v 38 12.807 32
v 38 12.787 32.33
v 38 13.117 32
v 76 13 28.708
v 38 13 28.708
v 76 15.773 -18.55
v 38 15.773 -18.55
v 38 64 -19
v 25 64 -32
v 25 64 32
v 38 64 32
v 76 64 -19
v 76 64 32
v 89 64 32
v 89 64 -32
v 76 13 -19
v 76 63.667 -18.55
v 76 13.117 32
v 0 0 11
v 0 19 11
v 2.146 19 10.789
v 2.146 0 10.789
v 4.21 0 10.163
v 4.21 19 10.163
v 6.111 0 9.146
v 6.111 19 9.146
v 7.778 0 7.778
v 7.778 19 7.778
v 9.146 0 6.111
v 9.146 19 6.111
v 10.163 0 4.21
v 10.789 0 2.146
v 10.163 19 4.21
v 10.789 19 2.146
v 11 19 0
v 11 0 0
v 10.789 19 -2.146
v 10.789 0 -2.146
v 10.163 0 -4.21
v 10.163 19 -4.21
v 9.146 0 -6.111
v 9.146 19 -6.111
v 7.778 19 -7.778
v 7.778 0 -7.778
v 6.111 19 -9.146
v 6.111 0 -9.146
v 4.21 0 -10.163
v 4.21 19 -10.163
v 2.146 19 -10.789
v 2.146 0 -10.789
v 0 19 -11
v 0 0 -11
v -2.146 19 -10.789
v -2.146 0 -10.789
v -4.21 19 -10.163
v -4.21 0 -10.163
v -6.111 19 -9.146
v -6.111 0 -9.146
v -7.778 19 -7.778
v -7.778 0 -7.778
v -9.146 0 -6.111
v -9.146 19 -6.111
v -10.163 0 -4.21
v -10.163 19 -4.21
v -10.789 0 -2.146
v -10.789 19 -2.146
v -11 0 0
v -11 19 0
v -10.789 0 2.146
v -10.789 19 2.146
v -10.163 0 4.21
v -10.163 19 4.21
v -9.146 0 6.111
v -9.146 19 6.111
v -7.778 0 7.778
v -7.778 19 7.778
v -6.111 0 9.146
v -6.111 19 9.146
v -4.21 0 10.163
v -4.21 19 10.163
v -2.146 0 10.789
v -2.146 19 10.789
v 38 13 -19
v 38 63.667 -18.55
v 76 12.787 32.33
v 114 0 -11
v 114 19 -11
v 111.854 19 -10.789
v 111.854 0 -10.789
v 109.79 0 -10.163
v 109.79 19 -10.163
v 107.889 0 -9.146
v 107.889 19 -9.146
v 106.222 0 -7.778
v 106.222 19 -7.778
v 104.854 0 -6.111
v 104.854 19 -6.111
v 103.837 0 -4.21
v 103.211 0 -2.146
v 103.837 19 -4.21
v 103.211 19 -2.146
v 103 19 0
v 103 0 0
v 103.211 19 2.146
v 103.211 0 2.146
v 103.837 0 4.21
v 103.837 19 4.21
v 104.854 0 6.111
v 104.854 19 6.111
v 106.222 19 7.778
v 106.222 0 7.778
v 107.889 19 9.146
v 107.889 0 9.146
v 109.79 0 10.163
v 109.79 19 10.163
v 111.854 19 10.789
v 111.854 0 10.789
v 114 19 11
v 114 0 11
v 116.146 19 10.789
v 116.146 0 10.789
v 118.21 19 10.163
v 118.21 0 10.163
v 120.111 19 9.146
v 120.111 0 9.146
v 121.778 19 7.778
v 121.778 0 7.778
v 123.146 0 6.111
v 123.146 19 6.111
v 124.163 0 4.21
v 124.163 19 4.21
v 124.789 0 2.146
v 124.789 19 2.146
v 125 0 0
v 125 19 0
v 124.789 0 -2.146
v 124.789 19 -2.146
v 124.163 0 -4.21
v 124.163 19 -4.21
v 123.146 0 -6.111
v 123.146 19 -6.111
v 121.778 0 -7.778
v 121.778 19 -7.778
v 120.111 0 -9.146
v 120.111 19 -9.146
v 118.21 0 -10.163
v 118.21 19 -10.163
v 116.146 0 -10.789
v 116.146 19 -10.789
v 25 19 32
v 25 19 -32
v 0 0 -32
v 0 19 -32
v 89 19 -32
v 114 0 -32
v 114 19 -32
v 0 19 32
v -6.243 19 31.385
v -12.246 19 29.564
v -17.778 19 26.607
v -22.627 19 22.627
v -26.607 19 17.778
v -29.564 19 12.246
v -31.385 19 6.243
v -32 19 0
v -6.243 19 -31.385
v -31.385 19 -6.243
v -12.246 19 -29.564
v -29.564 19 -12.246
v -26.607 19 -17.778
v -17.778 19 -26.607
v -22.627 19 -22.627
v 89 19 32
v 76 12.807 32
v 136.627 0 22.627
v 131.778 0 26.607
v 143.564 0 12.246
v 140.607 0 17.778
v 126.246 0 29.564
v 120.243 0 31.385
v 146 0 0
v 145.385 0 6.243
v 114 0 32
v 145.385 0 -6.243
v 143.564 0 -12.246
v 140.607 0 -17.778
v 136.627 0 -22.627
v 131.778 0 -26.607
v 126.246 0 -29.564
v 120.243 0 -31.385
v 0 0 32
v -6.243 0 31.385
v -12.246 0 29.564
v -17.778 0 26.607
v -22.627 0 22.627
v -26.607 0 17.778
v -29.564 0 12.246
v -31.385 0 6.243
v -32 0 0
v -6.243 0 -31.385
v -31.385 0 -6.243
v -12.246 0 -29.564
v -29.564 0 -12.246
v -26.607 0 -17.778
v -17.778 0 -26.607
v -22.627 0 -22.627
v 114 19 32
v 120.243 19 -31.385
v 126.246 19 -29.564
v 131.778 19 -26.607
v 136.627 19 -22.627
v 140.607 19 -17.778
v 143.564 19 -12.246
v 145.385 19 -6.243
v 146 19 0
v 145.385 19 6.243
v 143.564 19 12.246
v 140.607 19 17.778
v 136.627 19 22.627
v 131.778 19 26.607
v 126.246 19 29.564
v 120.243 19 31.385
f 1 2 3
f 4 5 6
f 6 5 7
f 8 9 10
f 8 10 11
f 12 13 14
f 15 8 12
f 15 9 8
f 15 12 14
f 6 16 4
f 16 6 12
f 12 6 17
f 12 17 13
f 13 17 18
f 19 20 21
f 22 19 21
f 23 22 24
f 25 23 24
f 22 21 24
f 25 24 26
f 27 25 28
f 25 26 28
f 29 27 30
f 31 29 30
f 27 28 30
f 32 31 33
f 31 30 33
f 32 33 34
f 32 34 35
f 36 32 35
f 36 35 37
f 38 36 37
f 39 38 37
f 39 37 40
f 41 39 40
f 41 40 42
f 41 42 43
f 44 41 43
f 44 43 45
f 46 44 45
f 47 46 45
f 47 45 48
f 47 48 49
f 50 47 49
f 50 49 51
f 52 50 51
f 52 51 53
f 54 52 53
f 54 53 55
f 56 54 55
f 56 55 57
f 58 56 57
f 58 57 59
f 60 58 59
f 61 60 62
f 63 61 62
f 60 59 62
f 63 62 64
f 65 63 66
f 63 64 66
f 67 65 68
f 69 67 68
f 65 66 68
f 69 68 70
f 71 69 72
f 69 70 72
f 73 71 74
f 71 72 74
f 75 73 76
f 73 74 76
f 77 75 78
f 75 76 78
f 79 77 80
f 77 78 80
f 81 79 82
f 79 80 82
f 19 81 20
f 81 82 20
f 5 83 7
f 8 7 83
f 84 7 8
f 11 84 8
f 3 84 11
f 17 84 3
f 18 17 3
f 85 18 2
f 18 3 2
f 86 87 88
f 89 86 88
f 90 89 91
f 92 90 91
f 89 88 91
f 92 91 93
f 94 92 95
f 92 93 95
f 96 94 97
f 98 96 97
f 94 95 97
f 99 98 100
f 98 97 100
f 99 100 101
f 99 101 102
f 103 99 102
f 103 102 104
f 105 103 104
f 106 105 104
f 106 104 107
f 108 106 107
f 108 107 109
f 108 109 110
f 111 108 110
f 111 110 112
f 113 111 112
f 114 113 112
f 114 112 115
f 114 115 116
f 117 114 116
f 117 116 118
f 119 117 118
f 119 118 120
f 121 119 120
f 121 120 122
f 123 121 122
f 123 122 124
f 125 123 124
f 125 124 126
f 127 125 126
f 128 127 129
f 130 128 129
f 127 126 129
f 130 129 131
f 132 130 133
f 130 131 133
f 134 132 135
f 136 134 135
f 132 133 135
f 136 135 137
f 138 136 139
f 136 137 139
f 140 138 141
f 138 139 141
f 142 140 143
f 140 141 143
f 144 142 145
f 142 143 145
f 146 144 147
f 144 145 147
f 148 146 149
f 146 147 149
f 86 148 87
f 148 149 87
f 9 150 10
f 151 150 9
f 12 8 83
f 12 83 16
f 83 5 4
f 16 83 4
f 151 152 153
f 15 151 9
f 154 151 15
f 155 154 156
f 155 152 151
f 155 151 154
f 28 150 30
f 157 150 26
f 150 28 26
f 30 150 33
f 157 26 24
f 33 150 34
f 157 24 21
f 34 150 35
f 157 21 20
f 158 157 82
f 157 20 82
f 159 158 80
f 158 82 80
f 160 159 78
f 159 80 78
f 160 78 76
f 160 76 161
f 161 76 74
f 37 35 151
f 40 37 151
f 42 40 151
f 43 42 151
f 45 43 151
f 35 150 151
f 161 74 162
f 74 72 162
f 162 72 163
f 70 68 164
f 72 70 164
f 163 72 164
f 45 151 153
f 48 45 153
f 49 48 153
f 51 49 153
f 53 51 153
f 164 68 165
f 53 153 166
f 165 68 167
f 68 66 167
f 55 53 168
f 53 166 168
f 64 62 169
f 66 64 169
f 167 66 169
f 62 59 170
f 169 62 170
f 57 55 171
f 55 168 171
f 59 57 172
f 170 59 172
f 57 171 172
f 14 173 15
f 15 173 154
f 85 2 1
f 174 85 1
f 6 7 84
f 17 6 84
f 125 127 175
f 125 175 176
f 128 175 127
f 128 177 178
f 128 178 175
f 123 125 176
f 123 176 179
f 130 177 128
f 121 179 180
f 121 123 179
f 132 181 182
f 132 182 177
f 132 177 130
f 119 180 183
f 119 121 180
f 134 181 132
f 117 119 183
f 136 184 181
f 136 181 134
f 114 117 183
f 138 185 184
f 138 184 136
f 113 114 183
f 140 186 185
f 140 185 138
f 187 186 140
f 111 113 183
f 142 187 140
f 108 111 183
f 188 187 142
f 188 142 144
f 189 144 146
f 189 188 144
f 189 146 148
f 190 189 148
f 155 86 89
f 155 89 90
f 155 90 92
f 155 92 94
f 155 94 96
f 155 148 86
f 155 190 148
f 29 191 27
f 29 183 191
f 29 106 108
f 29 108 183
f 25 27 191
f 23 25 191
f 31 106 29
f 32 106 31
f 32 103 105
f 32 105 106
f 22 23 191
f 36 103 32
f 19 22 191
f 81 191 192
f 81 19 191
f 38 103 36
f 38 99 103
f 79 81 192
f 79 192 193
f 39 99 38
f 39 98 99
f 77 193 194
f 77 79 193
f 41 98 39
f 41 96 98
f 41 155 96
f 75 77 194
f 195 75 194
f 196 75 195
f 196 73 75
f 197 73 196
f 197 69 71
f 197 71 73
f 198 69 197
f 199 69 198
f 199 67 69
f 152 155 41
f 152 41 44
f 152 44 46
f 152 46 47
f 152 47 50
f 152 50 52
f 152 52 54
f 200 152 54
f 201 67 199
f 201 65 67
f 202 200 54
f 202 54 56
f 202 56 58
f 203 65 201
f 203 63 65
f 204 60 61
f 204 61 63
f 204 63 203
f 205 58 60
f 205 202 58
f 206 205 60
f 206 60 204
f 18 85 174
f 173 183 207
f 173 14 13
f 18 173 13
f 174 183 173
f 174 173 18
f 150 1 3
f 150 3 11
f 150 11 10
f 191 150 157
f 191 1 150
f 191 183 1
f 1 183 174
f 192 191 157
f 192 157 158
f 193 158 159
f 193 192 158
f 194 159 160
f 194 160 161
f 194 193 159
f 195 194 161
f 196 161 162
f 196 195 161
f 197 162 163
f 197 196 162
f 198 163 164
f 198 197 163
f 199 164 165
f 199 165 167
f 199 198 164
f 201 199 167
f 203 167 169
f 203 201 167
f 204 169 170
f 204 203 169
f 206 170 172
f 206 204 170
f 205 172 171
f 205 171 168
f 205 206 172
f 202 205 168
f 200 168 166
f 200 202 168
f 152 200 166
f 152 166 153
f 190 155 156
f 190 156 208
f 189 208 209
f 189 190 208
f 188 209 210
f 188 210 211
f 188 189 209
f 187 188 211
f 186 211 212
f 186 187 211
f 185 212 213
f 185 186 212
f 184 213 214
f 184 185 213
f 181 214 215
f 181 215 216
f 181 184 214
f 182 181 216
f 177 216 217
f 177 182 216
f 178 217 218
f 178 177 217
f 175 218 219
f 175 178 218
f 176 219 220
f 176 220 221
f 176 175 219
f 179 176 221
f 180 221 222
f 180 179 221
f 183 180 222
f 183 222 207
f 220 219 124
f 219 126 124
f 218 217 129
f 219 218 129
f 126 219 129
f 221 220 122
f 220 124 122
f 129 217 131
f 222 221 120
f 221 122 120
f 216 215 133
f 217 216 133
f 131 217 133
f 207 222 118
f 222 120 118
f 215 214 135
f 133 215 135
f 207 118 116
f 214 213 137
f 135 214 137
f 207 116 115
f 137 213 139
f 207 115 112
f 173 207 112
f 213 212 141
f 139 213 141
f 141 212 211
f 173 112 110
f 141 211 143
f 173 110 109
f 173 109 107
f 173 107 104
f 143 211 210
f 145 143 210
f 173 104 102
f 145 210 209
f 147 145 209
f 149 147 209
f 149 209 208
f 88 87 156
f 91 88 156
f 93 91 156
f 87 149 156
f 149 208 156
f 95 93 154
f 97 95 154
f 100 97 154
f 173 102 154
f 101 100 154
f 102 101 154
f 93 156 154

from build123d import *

# Parameters (mm, degrees)
BOSS_EXTRUDE2_DEPTH = 19
SKETCH4_R           = 11
CUT_EXTRUDE1_DEPTH  = 151.668510313
SKETCH5_W           = 64
SKETCH5_H           = 64
BOSS_EXTRUDE3_DEPTH = 45
SKETCH6_W           = 38
SKETCH6_H           = 51
CUT_EXTRUDE2_DEPTH  = 51
BOSS_EXTRUDE4_DEPTH = 38


with BuildPart() as part:
    # Sketch3 → Boss-Extrude2 (new body)
    with BuildSketch(Plane(origin=(0, 0, 0), x_dir=(1, 0, 0), z_dir=(0, 1, 0))):
        with BuildLine():
            Line((0, 32), (114, 32))
            ThreePointArc((114, 32), (146, 0), (114, -32))
            Line((114, -32), (0, -32))
            ThreePointArc((0, -32), (-32, 0), (0, 32))
        make_face()
    extrude(amount=BOSS_EXTRUDE2_DEPTH)

    # Sketch4 → Cut-Extrude1 (cut, through all)
    with BuildSketch(Plane(origin=(0, 19, 0), x_dir=(1, 0, 0), z_dir=(0, 1, 0))):
        with Locations(Location((0, 0, 0), (0, 0, 270))):
            Circle(SKETCH4_R)
        with Locations(Location((114, 0, 0), (0, 0, 90))):
            Circle(SKETCH4_R)
    extrude(amount=-CUT_EXTRUDE1_DEPTH, mode=Mode.SUBTRACT)

    # Sketch5 → Boss-Extrude3 (add)
    with BuildSketch(Plane(origin=(0, 19, 0), x_dir=(1, 0, 0), z_dir=(0, 1, 0))):
        with Locations((57, 0)):
            Rectangle(SKETCH5_W, SKETCH5_H)
    extrude(amount=BOSS_EXTRUDE3_DEPTH)

    # Sketch6 → Cut-Extrude2 (cut)
    with BuildSketch(Plane.XY.offset(32)):
        with Locations((57, 38.5)):
            Rectangle(SKETCH6_W, SKETCH6_H)
    extrude(amount=-CUT_EXTRUDE2_DEPTH, mode=Mode.SUBTRACT)

    # Sketch8 → Boss-Extrude4 (add)
    with BuildSketch(Plane(origin=(38, 0, 0), x_dir=(0, 0, -1), z_dir=(1, 0, 0))):
        Polygon((18.549537032, 63.66671572), (-32.32969233, 12.787486357), (18.549537032, 15.77285286), align=None)
    extrude(amount=BOSS_EXTRUDE4_DEPTH)


solid = part.part
